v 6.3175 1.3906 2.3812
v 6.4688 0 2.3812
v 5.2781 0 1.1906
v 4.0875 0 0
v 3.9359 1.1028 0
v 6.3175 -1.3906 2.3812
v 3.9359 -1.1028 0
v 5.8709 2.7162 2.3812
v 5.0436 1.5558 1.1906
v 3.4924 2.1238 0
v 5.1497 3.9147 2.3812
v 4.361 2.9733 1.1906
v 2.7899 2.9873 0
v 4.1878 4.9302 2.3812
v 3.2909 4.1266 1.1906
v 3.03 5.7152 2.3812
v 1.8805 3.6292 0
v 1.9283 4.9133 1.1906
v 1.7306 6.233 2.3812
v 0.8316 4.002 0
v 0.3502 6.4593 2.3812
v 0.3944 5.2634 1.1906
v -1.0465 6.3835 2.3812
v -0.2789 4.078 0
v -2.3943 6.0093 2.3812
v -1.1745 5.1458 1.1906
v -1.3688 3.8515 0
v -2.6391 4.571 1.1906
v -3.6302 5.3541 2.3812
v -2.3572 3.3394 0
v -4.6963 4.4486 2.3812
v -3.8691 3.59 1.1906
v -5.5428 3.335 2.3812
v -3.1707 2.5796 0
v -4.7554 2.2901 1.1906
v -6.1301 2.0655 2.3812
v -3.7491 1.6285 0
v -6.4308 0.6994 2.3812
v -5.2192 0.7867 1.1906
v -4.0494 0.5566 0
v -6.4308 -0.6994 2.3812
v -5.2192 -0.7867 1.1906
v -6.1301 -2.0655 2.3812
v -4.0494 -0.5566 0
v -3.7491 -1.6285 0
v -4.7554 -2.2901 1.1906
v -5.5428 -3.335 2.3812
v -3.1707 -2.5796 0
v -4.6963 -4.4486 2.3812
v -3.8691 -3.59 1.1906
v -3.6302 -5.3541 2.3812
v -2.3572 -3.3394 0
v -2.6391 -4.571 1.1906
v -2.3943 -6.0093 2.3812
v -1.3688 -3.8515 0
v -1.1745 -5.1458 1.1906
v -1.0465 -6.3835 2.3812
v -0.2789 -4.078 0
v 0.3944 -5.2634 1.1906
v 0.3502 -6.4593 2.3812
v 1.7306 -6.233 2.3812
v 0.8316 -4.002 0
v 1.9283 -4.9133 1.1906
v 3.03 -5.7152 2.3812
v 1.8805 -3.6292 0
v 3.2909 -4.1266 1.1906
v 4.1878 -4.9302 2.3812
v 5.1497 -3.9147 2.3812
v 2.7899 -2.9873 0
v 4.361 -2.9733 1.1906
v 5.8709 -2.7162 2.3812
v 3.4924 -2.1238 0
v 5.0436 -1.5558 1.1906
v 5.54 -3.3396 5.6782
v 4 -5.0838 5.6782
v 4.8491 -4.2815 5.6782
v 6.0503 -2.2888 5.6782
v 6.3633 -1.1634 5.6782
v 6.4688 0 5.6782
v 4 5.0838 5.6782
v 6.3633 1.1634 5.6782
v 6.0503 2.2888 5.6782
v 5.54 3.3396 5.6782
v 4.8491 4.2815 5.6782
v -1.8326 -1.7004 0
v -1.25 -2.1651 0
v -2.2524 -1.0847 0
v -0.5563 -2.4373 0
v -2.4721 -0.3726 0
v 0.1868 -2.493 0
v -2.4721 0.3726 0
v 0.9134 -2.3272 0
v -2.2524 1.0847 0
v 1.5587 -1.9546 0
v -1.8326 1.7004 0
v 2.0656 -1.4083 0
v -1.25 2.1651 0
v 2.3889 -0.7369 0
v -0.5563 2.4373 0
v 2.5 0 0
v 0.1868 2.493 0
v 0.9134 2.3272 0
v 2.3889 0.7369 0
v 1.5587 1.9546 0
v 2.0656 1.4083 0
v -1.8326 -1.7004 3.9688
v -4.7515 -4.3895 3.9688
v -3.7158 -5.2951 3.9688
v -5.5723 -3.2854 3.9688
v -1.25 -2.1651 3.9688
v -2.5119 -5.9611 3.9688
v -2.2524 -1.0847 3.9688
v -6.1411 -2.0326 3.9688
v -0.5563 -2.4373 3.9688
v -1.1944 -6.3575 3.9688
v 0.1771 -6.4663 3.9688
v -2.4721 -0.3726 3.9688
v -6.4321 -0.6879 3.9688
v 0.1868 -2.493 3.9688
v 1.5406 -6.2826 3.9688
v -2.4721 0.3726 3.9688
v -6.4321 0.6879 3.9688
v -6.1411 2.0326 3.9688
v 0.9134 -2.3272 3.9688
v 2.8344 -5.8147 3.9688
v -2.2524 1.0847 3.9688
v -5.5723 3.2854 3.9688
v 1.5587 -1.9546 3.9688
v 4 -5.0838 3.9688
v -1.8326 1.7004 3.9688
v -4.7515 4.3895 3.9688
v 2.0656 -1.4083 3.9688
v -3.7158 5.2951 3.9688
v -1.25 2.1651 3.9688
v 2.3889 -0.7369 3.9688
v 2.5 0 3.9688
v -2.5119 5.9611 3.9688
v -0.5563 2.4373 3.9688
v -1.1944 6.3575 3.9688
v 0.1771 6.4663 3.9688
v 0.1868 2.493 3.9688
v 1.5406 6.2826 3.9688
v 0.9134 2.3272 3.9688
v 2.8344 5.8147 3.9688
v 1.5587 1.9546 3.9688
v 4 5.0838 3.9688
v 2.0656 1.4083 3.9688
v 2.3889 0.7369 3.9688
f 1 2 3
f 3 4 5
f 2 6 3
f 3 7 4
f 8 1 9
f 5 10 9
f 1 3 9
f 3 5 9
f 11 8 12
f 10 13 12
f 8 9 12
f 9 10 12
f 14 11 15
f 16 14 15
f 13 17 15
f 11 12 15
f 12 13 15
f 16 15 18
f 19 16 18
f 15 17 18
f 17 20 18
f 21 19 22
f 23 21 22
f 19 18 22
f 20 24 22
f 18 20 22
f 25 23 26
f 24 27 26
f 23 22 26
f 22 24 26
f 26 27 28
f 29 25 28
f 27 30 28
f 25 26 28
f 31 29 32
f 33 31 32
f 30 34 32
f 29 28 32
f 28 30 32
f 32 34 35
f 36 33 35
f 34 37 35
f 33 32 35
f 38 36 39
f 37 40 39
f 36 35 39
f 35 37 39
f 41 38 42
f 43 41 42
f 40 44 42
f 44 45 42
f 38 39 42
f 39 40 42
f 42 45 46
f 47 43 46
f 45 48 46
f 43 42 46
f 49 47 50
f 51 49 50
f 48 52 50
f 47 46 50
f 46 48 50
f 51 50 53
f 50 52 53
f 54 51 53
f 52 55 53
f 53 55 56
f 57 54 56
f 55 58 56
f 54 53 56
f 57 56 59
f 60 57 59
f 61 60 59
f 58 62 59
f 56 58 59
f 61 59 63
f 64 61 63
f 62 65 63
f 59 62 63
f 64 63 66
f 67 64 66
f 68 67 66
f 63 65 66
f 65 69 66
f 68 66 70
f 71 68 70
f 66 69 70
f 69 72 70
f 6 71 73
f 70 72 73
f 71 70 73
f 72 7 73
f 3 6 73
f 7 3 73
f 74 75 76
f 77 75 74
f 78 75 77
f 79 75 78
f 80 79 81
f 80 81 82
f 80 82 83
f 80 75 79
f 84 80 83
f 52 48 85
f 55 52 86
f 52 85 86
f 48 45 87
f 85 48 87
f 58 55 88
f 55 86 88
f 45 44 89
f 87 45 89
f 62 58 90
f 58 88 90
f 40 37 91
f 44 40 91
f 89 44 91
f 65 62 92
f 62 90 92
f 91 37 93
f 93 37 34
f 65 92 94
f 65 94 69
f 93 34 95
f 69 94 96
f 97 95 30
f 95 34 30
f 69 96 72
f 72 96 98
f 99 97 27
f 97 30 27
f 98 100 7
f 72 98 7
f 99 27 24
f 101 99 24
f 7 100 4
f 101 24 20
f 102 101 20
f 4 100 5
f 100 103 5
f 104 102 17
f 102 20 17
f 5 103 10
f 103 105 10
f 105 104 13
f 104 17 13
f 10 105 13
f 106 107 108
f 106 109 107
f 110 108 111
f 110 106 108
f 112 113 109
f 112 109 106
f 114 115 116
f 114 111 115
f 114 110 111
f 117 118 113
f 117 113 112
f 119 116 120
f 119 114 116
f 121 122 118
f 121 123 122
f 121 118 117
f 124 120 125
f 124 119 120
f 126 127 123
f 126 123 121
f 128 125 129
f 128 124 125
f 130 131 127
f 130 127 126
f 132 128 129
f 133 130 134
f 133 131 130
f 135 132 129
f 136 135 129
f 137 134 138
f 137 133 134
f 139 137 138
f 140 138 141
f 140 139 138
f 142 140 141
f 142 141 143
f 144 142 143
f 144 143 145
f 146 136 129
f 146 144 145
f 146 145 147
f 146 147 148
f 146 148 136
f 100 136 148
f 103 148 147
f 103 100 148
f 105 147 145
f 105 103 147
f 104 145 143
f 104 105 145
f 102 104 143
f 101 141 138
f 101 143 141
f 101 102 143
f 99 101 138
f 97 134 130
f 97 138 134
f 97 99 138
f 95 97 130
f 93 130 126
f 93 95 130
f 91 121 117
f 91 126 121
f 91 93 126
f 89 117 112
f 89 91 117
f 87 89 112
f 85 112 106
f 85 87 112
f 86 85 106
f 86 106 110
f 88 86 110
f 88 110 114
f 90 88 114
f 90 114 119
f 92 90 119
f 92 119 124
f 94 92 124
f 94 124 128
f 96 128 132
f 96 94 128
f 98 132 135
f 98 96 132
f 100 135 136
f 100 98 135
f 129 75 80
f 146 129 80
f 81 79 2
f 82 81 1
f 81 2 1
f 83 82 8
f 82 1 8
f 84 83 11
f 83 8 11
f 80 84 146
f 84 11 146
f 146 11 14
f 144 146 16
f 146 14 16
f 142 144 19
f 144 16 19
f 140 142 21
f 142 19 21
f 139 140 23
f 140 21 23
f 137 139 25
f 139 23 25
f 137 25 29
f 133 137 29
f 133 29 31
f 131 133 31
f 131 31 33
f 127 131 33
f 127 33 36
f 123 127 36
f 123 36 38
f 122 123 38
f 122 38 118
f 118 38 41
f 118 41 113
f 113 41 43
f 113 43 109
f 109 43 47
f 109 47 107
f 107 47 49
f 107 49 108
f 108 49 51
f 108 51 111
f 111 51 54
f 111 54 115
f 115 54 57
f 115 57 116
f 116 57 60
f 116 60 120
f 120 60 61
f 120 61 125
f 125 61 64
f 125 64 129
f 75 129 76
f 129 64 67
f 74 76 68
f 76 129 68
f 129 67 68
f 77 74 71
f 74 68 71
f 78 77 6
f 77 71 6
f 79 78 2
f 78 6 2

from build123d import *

# Parameters (mm, degrees)
F0_R     = 6.46875
F0_R_2   = 2.5
F1_DEPTH = 5.67817
F2_SIZE  = 2.38125
F3_W     = 10.46875
F3_H     = 12.9375
F4_DEPTH = 1.70942


with BuildPart() as f1:
    # F0 (on Top) → F1 (new body)
    with BuildSketch(Plane.XY):
        Circle(F0_R)
        Circle(F0_R_2, mode=Mode.SUBTRACT)
    extrude(amount=F1_DEPTH)

    # F2
    f2_edges = [f1.edges().sort_by_distance(p)[0] for p in [
        (-6.46875, 0, 0),
    ]]
    chamfer(f2_edges, length=F2_SIZE)

    # F3 (on face) → F4 (cut)
    with BuildSketch(Plane.XY.offset(5.67817)):
        with Locations((-1.234375, 0)):
            Rectangle(F3_W, F3_H)
    extrude(amount=-F4_DEPTH, mode=Mode.SUBTRACT)


solid = f1.part
